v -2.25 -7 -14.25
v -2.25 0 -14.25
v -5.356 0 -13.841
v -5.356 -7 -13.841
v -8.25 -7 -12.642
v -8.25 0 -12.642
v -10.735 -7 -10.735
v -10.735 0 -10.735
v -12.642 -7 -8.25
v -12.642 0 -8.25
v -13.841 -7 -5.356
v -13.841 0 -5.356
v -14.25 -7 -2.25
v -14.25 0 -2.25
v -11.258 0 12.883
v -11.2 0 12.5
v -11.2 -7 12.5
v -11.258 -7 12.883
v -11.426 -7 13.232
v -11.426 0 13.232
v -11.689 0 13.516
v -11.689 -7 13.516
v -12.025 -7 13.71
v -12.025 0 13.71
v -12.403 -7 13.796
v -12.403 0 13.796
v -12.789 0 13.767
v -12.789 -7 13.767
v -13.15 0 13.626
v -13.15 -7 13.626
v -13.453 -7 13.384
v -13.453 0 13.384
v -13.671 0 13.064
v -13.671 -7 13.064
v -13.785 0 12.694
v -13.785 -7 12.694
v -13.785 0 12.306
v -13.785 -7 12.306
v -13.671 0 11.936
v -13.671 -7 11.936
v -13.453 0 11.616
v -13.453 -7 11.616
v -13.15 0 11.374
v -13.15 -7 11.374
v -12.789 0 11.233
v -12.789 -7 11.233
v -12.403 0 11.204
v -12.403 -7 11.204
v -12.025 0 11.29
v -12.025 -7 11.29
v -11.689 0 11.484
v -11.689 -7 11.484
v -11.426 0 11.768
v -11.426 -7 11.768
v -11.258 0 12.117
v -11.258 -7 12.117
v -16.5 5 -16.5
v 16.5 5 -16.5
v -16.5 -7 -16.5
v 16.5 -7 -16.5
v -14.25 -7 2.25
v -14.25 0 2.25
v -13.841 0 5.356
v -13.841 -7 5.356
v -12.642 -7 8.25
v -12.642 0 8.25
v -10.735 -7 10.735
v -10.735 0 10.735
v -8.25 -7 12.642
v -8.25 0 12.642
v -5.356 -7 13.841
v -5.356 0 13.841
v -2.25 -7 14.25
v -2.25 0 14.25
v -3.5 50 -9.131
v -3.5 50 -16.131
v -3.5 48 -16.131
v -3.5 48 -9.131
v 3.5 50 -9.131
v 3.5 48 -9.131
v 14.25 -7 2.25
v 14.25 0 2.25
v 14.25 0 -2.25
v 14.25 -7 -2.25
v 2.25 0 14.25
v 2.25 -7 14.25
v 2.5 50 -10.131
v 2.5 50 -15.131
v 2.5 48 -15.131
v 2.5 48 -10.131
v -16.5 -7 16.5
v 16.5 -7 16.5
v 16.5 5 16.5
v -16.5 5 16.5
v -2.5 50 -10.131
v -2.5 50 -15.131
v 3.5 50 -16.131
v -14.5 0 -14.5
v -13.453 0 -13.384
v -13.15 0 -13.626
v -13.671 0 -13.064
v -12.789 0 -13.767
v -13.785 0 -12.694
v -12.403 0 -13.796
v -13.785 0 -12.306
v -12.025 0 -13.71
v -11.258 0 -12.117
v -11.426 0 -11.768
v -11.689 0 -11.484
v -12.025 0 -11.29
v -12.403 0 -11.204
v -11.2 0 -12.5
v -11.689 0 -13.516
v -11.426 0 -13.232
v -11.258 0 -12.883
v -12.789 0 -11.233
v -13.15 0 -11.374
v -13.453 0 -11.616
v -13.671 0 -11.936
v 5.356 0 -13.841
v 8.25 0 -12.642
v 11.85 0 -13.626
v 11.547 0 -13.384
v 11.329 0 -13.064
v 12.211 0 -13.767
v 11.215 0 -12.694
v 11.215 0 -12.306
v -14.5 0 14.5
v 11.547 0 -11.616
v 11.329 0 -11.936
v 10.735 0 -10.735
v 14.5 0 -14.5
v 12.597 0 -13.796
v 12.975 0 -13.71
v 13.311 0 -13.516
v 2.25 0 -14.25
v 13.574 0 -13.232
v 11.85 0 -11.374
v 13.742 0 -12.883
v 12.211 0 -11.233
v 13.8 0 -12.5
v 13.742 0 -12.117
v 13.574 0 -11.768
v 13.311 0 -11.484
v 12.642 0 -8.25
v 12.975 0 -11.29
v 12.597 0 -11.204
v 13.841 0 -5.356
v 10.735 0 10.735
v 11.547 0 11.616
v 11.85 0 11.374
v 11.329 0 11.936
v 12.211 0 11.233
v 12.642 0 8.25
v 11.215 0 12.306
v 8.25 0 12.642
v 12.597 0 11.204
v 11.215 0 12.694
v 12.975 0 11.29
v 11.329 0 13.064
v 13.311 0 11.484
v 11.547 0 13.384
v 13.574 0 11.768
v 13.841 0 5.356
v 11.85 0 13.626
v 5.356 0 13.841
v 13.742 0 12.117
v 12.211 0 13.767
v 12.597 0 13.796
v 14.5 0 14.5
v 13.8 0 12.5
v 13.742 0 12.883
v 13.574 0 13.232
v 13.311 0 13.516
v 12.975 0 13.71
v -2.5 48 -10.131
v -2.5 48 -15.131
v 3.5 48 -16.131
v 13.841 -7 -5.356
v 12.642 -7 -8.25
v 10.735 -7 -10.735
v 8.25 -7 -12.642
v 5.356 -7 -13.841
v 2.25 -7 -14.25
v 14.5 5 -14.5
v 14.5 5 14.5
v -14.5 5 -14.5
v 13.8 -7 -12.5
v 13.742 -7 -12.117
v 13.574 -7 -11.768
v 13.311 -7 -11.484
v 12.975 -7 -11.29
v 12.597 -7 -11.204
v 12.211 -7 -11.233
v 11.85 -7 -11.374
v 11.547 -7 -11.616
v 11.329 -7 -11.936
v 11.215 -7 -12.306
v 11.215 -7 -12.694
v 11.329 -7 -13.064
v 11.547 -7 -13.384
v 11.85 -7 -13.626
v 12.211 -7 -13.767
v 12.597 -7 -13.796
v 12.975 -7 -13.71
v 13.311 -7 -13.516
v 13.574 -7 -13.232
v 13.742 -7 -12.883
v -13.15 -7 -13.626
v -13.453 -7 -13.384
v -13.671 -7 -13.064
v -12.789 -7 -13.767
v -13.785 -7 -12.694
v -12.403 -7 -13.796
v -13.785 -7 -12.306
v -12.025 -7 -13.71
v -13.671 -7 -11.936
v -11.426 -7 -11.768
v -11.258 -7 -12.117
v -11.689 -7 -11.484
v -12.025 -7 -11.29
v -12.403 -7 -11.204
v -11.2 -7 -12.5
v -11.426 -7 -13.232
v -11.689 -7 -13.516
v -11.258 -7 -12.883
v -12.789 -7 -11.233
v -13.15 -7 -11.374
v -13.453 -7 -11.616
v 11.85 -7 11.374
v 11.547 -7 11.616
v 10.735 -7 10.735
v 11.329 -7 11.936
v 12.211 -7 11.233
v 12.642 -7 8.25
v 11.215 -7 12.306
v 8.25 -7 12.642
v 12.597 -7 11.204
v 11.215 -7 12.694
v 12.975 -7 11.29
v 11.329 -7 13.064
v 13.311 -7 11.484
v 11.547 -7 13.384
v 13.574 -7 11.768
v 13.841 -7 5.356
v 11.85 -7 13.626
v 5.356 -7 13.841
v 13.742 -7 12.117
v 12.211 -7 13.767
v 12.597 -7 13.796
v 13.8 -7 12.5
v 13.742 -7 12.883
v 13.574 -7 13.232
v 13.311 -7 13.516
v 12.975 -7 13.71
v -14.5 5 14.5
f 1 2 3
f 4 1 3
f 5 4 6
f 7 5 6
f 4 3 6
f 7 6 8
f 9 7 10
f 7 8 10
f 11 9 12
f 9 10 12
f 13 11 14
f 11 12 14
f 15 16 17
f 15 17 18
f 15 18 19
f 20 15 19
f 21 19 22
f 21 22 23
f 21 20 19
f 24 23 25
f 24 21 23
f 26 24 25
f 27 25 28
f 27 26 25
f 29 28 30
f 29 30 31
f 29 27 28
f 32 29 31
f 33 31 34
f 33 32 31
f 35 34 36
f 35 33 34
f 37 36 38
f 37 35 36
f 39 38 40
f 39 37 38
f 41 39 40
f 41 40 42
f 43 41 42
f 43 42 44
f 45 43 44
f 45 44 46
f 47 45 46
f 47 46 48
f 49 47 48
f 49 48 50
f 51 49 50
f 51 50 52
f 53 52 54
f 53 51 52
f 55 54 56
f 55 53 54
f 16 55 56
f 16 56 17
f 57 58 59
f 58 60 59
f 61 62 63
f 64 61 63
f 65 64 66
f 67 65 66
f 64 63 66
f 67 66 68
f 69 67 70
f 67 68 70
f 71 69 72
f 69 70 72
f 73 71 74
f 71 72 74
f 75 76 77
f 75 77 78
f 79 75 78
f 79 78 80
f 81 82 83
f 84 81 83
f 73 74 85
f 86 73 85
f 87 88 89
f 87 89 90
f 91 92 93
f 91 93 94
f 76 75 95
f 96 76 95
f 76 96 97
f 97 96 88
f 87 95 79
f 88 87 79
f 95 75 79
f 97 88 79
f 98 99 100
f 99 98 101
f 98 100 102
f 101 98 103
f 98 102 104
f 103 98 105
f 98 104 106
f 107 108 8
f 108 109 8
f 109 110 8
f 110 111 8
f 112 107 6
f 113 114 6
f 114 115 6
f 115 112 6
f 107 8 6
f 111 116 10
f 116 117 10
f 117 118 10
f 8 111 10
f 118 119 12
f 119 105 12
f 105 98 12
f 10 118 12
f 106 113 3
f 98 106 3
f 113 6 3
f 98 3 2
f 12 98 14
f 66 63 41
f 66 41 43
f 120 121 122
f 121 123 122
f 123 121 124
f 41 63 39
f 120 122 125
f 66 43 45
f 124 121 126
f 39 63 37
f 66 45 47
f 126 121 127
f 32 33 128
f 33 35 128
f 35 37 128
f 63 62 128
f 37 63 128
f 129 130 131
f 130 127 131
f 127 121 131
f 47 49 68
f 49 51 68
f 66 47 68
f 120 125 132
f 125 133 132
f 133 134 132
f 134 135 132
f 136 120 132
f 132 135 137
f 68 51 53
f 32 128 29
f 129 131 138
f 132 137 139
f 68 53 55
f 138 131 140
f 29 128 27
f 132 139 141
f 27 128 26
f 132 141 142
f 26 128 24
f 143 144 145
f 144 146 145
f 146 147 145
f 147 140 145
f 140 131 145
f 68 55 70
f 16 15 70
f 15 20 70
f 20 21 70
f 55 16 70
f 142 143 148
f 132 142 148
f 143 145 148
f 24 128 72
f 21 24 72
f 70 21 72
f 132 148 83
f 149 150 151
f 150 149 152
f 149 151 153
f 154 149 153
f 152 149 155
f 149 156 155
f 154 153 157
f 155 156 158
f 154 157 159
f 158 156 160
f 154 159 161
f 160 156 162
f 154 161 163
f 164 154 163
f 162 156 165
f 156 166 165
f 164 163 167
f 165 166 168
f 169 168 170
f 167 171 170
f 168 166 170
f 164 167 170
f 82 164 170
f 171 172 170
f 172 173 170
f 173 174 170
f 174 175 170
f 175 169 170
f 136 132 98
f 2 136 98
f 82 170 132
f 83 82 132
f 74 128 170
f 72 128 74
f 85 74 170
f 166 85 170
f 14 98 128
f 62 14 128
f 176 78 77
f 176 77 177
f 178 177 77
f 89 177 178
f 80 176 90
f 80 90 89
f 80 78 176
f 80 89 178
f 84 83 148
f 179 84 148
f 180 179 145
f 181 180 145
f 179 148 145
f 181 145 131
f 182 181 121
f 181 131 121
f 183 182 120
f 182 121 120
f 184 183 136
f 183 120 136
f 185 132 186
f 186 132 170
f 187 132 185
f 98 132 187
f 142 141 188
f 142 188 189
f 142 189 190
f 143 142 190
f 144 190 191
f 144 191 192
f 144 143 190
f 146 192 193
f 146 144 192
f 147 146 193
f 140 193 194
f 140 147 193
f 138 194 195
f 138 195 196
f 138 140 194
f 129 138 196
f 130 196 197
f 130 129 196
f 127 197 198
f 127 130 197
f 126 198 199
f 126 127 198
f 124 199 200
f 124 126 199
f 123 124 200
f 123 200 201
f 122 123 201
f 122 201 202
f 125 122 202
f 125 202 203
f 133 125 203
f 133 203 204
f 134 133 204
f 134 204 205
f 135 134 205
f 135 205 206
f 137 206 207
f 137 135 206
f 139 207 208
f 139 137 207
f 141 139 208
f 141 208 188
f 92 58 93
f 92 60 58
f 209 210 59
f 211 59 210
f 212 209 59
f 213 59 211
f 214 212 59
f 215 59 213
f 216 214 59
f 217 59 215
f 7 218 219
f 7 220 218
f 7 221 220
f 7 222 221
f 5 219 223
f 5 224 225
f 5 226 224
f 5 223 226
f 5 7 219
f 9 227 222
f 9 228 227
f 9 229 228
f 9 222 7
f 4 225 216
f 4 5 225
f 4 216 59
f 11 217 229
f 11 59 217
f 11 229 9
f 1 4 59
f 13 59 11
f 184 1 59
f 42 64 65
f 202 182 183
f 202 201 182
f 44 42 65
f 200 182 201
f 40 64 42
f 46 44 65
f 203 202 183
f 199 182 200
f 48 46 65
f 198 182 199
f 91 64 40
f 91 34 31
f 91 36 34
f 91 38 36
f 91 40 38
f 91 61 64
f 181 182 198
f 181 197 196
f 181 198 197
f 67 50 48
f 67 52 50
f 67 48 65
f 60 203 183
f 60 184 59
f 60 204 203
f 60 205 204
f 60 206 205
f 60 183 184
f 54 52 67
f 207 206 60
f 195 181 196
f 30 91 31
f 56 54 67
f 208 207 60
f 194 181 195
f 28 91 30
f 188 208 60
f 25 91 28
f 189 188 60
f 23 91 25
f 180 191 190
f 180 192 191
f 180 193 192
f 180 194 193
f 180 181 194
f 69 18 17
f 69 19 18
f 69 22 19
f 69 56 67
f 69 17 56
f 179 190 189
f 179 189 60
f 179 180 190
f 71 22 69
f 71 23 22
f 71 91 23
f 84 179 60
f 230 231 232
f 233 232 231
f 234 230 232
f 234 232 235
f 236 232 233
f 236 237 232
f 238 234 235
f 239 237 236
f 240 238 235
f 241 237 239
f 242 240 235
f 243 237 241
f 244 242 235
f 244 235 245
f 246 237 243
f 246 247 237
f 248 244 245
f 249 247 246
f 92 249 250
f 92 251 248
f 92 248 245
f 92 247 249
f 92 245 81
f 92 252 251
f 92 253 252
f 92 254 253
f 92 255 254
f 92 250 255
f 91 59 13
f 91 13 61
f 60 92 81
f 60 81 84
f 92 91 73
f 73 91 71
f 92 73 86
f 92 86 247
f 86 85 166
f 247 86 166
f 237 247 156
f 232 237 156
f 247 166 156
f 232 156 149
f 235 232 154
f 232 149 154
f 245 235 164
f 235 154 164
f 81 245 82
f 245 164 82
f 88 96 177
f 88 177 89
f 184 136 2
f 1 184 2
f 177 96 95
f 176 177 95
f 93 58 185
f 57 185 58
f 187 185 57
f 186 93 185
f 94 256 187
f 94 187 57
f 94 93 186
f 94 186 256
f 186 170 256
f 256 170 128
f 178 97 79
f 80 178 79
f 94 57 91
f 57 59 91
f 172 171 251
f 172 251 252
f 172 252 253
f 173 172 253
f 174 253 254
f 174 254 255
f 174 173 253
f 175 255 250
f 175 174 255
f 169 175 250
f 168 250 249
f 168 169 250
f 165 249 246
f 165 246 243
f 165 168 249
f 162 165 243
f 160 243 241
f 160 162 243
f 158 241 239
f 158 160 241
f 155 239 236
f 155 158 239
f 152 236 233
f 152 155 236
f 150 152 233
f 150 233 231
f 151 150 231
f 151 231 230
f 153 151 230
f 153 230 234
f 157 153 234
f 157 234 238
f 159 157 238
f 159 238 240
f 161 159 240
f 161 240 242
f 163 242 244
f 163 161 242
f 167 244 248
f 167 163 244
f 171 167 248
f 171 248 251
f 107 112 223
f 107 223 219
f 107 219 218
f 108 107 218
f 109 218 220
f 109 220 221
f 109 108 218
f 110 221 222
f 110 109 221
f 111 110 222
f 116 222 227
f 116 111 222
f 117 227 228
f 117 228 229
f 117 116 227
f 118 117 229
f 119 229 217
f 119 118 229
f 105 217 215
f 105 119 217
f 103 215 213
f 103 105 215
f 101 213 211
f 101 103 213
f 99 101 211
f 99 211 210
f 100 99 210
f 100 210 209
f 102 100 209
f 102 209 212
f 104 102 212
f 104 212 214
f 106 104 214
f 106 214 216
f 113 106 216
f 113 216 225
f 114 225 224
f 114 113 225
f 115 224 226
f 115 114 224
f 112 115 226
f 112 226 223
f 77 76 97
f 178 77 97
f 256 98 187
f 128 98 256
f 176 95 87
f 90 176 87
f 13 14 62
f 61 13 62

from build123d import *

# Parameters (mm, degrees)
F0_W     = 33
F0_H     = 33
F0_R     = 1.3
F2_DEPTH = 7
F3_W     = 33
F3_H     = 33
F3_W_2   = 29
F3_H_2   = 29
F4_DEPTH = 5
F5_W     = 7
F5_H     = 7
F5_W_2   = 5
F5_H_2   = 5
F6_DEPTH = 2


with BuildPart() as f2:
    # F0 (on Front) → F2 (new body)
    with BuildSketch(Plane.XZ):
        Rectangle(F0_W, F0_H)
        with Locations((-12.5, -12.5)):
            Circle(F0_R, mode=Mode.SUBTRACT)
        with Locations((12.5, -12.5)):
            Circle(F0_R, mode=Mode.SUBTRACT)
        with Locations((-12.5, 12.5)):
            Circle(F0_R, mode=Mode.SUBTRACT)
        with BuildLine():
            ThreePointArc((14.25, -2.25), (10.735281, -10.735281), (2.25, -14.25))
            Line((2.25, -14.25), (-2.25, -14.25))
            ThreePointArc((-2.25, -14.25), (-10.735281, -10.735281), (-14.25, -2.25))
            Line((-14.25, -2.25), (-14.25, 2.25))
            ThreePointArc((-14.25, 2.25), (-10.735281, 10.735281), (-2.25, 14.25))
            Line((-2.25, 14.25), (2.25, 14.25))
            ThreePointArc((2.25, 14.25), (10.735281, 10.735281), (14.25, 2.25))
            Line((14.25, 2.25), (14.25, -2.25))
        make_face(mode=Mode.SUBTRACT)
        with Locations((12.5, 12.5)):
            Circle(F0_R, mode=Mode.SUBTRACT)
    extrude(amount=F2_DEPTH)

    # F3 (on face) → F4 (join)
    with BuildSketch(Plane(origin=(0, 0, 0), x_dir=(-1, 0, 0), z_dir=(0, 1, 0))):
        Rectangle(F3_W, F3_H)
        Rectangle(F3_W_2, F3_H_2, mode=Mode.SUBTRACT)
    extrude(amount=F4_DEPTH)


with BuildPart() as f6:
    # F5 (on offset) → F6 (new body)
    with BuildSketch(Plane.XZ.offset(-50)):
        with Locations((0, -12.631277)):
            Rectangle(F5_W, F5_H)
        with Locations((0, -12.631277)):
            Rectangle(F5_W_2, F5_H_2, mode=Mode.SUBTRACT)
    extrude(amount=F6_DEPTH)


solid = Compound([f2.part, f6.part])
